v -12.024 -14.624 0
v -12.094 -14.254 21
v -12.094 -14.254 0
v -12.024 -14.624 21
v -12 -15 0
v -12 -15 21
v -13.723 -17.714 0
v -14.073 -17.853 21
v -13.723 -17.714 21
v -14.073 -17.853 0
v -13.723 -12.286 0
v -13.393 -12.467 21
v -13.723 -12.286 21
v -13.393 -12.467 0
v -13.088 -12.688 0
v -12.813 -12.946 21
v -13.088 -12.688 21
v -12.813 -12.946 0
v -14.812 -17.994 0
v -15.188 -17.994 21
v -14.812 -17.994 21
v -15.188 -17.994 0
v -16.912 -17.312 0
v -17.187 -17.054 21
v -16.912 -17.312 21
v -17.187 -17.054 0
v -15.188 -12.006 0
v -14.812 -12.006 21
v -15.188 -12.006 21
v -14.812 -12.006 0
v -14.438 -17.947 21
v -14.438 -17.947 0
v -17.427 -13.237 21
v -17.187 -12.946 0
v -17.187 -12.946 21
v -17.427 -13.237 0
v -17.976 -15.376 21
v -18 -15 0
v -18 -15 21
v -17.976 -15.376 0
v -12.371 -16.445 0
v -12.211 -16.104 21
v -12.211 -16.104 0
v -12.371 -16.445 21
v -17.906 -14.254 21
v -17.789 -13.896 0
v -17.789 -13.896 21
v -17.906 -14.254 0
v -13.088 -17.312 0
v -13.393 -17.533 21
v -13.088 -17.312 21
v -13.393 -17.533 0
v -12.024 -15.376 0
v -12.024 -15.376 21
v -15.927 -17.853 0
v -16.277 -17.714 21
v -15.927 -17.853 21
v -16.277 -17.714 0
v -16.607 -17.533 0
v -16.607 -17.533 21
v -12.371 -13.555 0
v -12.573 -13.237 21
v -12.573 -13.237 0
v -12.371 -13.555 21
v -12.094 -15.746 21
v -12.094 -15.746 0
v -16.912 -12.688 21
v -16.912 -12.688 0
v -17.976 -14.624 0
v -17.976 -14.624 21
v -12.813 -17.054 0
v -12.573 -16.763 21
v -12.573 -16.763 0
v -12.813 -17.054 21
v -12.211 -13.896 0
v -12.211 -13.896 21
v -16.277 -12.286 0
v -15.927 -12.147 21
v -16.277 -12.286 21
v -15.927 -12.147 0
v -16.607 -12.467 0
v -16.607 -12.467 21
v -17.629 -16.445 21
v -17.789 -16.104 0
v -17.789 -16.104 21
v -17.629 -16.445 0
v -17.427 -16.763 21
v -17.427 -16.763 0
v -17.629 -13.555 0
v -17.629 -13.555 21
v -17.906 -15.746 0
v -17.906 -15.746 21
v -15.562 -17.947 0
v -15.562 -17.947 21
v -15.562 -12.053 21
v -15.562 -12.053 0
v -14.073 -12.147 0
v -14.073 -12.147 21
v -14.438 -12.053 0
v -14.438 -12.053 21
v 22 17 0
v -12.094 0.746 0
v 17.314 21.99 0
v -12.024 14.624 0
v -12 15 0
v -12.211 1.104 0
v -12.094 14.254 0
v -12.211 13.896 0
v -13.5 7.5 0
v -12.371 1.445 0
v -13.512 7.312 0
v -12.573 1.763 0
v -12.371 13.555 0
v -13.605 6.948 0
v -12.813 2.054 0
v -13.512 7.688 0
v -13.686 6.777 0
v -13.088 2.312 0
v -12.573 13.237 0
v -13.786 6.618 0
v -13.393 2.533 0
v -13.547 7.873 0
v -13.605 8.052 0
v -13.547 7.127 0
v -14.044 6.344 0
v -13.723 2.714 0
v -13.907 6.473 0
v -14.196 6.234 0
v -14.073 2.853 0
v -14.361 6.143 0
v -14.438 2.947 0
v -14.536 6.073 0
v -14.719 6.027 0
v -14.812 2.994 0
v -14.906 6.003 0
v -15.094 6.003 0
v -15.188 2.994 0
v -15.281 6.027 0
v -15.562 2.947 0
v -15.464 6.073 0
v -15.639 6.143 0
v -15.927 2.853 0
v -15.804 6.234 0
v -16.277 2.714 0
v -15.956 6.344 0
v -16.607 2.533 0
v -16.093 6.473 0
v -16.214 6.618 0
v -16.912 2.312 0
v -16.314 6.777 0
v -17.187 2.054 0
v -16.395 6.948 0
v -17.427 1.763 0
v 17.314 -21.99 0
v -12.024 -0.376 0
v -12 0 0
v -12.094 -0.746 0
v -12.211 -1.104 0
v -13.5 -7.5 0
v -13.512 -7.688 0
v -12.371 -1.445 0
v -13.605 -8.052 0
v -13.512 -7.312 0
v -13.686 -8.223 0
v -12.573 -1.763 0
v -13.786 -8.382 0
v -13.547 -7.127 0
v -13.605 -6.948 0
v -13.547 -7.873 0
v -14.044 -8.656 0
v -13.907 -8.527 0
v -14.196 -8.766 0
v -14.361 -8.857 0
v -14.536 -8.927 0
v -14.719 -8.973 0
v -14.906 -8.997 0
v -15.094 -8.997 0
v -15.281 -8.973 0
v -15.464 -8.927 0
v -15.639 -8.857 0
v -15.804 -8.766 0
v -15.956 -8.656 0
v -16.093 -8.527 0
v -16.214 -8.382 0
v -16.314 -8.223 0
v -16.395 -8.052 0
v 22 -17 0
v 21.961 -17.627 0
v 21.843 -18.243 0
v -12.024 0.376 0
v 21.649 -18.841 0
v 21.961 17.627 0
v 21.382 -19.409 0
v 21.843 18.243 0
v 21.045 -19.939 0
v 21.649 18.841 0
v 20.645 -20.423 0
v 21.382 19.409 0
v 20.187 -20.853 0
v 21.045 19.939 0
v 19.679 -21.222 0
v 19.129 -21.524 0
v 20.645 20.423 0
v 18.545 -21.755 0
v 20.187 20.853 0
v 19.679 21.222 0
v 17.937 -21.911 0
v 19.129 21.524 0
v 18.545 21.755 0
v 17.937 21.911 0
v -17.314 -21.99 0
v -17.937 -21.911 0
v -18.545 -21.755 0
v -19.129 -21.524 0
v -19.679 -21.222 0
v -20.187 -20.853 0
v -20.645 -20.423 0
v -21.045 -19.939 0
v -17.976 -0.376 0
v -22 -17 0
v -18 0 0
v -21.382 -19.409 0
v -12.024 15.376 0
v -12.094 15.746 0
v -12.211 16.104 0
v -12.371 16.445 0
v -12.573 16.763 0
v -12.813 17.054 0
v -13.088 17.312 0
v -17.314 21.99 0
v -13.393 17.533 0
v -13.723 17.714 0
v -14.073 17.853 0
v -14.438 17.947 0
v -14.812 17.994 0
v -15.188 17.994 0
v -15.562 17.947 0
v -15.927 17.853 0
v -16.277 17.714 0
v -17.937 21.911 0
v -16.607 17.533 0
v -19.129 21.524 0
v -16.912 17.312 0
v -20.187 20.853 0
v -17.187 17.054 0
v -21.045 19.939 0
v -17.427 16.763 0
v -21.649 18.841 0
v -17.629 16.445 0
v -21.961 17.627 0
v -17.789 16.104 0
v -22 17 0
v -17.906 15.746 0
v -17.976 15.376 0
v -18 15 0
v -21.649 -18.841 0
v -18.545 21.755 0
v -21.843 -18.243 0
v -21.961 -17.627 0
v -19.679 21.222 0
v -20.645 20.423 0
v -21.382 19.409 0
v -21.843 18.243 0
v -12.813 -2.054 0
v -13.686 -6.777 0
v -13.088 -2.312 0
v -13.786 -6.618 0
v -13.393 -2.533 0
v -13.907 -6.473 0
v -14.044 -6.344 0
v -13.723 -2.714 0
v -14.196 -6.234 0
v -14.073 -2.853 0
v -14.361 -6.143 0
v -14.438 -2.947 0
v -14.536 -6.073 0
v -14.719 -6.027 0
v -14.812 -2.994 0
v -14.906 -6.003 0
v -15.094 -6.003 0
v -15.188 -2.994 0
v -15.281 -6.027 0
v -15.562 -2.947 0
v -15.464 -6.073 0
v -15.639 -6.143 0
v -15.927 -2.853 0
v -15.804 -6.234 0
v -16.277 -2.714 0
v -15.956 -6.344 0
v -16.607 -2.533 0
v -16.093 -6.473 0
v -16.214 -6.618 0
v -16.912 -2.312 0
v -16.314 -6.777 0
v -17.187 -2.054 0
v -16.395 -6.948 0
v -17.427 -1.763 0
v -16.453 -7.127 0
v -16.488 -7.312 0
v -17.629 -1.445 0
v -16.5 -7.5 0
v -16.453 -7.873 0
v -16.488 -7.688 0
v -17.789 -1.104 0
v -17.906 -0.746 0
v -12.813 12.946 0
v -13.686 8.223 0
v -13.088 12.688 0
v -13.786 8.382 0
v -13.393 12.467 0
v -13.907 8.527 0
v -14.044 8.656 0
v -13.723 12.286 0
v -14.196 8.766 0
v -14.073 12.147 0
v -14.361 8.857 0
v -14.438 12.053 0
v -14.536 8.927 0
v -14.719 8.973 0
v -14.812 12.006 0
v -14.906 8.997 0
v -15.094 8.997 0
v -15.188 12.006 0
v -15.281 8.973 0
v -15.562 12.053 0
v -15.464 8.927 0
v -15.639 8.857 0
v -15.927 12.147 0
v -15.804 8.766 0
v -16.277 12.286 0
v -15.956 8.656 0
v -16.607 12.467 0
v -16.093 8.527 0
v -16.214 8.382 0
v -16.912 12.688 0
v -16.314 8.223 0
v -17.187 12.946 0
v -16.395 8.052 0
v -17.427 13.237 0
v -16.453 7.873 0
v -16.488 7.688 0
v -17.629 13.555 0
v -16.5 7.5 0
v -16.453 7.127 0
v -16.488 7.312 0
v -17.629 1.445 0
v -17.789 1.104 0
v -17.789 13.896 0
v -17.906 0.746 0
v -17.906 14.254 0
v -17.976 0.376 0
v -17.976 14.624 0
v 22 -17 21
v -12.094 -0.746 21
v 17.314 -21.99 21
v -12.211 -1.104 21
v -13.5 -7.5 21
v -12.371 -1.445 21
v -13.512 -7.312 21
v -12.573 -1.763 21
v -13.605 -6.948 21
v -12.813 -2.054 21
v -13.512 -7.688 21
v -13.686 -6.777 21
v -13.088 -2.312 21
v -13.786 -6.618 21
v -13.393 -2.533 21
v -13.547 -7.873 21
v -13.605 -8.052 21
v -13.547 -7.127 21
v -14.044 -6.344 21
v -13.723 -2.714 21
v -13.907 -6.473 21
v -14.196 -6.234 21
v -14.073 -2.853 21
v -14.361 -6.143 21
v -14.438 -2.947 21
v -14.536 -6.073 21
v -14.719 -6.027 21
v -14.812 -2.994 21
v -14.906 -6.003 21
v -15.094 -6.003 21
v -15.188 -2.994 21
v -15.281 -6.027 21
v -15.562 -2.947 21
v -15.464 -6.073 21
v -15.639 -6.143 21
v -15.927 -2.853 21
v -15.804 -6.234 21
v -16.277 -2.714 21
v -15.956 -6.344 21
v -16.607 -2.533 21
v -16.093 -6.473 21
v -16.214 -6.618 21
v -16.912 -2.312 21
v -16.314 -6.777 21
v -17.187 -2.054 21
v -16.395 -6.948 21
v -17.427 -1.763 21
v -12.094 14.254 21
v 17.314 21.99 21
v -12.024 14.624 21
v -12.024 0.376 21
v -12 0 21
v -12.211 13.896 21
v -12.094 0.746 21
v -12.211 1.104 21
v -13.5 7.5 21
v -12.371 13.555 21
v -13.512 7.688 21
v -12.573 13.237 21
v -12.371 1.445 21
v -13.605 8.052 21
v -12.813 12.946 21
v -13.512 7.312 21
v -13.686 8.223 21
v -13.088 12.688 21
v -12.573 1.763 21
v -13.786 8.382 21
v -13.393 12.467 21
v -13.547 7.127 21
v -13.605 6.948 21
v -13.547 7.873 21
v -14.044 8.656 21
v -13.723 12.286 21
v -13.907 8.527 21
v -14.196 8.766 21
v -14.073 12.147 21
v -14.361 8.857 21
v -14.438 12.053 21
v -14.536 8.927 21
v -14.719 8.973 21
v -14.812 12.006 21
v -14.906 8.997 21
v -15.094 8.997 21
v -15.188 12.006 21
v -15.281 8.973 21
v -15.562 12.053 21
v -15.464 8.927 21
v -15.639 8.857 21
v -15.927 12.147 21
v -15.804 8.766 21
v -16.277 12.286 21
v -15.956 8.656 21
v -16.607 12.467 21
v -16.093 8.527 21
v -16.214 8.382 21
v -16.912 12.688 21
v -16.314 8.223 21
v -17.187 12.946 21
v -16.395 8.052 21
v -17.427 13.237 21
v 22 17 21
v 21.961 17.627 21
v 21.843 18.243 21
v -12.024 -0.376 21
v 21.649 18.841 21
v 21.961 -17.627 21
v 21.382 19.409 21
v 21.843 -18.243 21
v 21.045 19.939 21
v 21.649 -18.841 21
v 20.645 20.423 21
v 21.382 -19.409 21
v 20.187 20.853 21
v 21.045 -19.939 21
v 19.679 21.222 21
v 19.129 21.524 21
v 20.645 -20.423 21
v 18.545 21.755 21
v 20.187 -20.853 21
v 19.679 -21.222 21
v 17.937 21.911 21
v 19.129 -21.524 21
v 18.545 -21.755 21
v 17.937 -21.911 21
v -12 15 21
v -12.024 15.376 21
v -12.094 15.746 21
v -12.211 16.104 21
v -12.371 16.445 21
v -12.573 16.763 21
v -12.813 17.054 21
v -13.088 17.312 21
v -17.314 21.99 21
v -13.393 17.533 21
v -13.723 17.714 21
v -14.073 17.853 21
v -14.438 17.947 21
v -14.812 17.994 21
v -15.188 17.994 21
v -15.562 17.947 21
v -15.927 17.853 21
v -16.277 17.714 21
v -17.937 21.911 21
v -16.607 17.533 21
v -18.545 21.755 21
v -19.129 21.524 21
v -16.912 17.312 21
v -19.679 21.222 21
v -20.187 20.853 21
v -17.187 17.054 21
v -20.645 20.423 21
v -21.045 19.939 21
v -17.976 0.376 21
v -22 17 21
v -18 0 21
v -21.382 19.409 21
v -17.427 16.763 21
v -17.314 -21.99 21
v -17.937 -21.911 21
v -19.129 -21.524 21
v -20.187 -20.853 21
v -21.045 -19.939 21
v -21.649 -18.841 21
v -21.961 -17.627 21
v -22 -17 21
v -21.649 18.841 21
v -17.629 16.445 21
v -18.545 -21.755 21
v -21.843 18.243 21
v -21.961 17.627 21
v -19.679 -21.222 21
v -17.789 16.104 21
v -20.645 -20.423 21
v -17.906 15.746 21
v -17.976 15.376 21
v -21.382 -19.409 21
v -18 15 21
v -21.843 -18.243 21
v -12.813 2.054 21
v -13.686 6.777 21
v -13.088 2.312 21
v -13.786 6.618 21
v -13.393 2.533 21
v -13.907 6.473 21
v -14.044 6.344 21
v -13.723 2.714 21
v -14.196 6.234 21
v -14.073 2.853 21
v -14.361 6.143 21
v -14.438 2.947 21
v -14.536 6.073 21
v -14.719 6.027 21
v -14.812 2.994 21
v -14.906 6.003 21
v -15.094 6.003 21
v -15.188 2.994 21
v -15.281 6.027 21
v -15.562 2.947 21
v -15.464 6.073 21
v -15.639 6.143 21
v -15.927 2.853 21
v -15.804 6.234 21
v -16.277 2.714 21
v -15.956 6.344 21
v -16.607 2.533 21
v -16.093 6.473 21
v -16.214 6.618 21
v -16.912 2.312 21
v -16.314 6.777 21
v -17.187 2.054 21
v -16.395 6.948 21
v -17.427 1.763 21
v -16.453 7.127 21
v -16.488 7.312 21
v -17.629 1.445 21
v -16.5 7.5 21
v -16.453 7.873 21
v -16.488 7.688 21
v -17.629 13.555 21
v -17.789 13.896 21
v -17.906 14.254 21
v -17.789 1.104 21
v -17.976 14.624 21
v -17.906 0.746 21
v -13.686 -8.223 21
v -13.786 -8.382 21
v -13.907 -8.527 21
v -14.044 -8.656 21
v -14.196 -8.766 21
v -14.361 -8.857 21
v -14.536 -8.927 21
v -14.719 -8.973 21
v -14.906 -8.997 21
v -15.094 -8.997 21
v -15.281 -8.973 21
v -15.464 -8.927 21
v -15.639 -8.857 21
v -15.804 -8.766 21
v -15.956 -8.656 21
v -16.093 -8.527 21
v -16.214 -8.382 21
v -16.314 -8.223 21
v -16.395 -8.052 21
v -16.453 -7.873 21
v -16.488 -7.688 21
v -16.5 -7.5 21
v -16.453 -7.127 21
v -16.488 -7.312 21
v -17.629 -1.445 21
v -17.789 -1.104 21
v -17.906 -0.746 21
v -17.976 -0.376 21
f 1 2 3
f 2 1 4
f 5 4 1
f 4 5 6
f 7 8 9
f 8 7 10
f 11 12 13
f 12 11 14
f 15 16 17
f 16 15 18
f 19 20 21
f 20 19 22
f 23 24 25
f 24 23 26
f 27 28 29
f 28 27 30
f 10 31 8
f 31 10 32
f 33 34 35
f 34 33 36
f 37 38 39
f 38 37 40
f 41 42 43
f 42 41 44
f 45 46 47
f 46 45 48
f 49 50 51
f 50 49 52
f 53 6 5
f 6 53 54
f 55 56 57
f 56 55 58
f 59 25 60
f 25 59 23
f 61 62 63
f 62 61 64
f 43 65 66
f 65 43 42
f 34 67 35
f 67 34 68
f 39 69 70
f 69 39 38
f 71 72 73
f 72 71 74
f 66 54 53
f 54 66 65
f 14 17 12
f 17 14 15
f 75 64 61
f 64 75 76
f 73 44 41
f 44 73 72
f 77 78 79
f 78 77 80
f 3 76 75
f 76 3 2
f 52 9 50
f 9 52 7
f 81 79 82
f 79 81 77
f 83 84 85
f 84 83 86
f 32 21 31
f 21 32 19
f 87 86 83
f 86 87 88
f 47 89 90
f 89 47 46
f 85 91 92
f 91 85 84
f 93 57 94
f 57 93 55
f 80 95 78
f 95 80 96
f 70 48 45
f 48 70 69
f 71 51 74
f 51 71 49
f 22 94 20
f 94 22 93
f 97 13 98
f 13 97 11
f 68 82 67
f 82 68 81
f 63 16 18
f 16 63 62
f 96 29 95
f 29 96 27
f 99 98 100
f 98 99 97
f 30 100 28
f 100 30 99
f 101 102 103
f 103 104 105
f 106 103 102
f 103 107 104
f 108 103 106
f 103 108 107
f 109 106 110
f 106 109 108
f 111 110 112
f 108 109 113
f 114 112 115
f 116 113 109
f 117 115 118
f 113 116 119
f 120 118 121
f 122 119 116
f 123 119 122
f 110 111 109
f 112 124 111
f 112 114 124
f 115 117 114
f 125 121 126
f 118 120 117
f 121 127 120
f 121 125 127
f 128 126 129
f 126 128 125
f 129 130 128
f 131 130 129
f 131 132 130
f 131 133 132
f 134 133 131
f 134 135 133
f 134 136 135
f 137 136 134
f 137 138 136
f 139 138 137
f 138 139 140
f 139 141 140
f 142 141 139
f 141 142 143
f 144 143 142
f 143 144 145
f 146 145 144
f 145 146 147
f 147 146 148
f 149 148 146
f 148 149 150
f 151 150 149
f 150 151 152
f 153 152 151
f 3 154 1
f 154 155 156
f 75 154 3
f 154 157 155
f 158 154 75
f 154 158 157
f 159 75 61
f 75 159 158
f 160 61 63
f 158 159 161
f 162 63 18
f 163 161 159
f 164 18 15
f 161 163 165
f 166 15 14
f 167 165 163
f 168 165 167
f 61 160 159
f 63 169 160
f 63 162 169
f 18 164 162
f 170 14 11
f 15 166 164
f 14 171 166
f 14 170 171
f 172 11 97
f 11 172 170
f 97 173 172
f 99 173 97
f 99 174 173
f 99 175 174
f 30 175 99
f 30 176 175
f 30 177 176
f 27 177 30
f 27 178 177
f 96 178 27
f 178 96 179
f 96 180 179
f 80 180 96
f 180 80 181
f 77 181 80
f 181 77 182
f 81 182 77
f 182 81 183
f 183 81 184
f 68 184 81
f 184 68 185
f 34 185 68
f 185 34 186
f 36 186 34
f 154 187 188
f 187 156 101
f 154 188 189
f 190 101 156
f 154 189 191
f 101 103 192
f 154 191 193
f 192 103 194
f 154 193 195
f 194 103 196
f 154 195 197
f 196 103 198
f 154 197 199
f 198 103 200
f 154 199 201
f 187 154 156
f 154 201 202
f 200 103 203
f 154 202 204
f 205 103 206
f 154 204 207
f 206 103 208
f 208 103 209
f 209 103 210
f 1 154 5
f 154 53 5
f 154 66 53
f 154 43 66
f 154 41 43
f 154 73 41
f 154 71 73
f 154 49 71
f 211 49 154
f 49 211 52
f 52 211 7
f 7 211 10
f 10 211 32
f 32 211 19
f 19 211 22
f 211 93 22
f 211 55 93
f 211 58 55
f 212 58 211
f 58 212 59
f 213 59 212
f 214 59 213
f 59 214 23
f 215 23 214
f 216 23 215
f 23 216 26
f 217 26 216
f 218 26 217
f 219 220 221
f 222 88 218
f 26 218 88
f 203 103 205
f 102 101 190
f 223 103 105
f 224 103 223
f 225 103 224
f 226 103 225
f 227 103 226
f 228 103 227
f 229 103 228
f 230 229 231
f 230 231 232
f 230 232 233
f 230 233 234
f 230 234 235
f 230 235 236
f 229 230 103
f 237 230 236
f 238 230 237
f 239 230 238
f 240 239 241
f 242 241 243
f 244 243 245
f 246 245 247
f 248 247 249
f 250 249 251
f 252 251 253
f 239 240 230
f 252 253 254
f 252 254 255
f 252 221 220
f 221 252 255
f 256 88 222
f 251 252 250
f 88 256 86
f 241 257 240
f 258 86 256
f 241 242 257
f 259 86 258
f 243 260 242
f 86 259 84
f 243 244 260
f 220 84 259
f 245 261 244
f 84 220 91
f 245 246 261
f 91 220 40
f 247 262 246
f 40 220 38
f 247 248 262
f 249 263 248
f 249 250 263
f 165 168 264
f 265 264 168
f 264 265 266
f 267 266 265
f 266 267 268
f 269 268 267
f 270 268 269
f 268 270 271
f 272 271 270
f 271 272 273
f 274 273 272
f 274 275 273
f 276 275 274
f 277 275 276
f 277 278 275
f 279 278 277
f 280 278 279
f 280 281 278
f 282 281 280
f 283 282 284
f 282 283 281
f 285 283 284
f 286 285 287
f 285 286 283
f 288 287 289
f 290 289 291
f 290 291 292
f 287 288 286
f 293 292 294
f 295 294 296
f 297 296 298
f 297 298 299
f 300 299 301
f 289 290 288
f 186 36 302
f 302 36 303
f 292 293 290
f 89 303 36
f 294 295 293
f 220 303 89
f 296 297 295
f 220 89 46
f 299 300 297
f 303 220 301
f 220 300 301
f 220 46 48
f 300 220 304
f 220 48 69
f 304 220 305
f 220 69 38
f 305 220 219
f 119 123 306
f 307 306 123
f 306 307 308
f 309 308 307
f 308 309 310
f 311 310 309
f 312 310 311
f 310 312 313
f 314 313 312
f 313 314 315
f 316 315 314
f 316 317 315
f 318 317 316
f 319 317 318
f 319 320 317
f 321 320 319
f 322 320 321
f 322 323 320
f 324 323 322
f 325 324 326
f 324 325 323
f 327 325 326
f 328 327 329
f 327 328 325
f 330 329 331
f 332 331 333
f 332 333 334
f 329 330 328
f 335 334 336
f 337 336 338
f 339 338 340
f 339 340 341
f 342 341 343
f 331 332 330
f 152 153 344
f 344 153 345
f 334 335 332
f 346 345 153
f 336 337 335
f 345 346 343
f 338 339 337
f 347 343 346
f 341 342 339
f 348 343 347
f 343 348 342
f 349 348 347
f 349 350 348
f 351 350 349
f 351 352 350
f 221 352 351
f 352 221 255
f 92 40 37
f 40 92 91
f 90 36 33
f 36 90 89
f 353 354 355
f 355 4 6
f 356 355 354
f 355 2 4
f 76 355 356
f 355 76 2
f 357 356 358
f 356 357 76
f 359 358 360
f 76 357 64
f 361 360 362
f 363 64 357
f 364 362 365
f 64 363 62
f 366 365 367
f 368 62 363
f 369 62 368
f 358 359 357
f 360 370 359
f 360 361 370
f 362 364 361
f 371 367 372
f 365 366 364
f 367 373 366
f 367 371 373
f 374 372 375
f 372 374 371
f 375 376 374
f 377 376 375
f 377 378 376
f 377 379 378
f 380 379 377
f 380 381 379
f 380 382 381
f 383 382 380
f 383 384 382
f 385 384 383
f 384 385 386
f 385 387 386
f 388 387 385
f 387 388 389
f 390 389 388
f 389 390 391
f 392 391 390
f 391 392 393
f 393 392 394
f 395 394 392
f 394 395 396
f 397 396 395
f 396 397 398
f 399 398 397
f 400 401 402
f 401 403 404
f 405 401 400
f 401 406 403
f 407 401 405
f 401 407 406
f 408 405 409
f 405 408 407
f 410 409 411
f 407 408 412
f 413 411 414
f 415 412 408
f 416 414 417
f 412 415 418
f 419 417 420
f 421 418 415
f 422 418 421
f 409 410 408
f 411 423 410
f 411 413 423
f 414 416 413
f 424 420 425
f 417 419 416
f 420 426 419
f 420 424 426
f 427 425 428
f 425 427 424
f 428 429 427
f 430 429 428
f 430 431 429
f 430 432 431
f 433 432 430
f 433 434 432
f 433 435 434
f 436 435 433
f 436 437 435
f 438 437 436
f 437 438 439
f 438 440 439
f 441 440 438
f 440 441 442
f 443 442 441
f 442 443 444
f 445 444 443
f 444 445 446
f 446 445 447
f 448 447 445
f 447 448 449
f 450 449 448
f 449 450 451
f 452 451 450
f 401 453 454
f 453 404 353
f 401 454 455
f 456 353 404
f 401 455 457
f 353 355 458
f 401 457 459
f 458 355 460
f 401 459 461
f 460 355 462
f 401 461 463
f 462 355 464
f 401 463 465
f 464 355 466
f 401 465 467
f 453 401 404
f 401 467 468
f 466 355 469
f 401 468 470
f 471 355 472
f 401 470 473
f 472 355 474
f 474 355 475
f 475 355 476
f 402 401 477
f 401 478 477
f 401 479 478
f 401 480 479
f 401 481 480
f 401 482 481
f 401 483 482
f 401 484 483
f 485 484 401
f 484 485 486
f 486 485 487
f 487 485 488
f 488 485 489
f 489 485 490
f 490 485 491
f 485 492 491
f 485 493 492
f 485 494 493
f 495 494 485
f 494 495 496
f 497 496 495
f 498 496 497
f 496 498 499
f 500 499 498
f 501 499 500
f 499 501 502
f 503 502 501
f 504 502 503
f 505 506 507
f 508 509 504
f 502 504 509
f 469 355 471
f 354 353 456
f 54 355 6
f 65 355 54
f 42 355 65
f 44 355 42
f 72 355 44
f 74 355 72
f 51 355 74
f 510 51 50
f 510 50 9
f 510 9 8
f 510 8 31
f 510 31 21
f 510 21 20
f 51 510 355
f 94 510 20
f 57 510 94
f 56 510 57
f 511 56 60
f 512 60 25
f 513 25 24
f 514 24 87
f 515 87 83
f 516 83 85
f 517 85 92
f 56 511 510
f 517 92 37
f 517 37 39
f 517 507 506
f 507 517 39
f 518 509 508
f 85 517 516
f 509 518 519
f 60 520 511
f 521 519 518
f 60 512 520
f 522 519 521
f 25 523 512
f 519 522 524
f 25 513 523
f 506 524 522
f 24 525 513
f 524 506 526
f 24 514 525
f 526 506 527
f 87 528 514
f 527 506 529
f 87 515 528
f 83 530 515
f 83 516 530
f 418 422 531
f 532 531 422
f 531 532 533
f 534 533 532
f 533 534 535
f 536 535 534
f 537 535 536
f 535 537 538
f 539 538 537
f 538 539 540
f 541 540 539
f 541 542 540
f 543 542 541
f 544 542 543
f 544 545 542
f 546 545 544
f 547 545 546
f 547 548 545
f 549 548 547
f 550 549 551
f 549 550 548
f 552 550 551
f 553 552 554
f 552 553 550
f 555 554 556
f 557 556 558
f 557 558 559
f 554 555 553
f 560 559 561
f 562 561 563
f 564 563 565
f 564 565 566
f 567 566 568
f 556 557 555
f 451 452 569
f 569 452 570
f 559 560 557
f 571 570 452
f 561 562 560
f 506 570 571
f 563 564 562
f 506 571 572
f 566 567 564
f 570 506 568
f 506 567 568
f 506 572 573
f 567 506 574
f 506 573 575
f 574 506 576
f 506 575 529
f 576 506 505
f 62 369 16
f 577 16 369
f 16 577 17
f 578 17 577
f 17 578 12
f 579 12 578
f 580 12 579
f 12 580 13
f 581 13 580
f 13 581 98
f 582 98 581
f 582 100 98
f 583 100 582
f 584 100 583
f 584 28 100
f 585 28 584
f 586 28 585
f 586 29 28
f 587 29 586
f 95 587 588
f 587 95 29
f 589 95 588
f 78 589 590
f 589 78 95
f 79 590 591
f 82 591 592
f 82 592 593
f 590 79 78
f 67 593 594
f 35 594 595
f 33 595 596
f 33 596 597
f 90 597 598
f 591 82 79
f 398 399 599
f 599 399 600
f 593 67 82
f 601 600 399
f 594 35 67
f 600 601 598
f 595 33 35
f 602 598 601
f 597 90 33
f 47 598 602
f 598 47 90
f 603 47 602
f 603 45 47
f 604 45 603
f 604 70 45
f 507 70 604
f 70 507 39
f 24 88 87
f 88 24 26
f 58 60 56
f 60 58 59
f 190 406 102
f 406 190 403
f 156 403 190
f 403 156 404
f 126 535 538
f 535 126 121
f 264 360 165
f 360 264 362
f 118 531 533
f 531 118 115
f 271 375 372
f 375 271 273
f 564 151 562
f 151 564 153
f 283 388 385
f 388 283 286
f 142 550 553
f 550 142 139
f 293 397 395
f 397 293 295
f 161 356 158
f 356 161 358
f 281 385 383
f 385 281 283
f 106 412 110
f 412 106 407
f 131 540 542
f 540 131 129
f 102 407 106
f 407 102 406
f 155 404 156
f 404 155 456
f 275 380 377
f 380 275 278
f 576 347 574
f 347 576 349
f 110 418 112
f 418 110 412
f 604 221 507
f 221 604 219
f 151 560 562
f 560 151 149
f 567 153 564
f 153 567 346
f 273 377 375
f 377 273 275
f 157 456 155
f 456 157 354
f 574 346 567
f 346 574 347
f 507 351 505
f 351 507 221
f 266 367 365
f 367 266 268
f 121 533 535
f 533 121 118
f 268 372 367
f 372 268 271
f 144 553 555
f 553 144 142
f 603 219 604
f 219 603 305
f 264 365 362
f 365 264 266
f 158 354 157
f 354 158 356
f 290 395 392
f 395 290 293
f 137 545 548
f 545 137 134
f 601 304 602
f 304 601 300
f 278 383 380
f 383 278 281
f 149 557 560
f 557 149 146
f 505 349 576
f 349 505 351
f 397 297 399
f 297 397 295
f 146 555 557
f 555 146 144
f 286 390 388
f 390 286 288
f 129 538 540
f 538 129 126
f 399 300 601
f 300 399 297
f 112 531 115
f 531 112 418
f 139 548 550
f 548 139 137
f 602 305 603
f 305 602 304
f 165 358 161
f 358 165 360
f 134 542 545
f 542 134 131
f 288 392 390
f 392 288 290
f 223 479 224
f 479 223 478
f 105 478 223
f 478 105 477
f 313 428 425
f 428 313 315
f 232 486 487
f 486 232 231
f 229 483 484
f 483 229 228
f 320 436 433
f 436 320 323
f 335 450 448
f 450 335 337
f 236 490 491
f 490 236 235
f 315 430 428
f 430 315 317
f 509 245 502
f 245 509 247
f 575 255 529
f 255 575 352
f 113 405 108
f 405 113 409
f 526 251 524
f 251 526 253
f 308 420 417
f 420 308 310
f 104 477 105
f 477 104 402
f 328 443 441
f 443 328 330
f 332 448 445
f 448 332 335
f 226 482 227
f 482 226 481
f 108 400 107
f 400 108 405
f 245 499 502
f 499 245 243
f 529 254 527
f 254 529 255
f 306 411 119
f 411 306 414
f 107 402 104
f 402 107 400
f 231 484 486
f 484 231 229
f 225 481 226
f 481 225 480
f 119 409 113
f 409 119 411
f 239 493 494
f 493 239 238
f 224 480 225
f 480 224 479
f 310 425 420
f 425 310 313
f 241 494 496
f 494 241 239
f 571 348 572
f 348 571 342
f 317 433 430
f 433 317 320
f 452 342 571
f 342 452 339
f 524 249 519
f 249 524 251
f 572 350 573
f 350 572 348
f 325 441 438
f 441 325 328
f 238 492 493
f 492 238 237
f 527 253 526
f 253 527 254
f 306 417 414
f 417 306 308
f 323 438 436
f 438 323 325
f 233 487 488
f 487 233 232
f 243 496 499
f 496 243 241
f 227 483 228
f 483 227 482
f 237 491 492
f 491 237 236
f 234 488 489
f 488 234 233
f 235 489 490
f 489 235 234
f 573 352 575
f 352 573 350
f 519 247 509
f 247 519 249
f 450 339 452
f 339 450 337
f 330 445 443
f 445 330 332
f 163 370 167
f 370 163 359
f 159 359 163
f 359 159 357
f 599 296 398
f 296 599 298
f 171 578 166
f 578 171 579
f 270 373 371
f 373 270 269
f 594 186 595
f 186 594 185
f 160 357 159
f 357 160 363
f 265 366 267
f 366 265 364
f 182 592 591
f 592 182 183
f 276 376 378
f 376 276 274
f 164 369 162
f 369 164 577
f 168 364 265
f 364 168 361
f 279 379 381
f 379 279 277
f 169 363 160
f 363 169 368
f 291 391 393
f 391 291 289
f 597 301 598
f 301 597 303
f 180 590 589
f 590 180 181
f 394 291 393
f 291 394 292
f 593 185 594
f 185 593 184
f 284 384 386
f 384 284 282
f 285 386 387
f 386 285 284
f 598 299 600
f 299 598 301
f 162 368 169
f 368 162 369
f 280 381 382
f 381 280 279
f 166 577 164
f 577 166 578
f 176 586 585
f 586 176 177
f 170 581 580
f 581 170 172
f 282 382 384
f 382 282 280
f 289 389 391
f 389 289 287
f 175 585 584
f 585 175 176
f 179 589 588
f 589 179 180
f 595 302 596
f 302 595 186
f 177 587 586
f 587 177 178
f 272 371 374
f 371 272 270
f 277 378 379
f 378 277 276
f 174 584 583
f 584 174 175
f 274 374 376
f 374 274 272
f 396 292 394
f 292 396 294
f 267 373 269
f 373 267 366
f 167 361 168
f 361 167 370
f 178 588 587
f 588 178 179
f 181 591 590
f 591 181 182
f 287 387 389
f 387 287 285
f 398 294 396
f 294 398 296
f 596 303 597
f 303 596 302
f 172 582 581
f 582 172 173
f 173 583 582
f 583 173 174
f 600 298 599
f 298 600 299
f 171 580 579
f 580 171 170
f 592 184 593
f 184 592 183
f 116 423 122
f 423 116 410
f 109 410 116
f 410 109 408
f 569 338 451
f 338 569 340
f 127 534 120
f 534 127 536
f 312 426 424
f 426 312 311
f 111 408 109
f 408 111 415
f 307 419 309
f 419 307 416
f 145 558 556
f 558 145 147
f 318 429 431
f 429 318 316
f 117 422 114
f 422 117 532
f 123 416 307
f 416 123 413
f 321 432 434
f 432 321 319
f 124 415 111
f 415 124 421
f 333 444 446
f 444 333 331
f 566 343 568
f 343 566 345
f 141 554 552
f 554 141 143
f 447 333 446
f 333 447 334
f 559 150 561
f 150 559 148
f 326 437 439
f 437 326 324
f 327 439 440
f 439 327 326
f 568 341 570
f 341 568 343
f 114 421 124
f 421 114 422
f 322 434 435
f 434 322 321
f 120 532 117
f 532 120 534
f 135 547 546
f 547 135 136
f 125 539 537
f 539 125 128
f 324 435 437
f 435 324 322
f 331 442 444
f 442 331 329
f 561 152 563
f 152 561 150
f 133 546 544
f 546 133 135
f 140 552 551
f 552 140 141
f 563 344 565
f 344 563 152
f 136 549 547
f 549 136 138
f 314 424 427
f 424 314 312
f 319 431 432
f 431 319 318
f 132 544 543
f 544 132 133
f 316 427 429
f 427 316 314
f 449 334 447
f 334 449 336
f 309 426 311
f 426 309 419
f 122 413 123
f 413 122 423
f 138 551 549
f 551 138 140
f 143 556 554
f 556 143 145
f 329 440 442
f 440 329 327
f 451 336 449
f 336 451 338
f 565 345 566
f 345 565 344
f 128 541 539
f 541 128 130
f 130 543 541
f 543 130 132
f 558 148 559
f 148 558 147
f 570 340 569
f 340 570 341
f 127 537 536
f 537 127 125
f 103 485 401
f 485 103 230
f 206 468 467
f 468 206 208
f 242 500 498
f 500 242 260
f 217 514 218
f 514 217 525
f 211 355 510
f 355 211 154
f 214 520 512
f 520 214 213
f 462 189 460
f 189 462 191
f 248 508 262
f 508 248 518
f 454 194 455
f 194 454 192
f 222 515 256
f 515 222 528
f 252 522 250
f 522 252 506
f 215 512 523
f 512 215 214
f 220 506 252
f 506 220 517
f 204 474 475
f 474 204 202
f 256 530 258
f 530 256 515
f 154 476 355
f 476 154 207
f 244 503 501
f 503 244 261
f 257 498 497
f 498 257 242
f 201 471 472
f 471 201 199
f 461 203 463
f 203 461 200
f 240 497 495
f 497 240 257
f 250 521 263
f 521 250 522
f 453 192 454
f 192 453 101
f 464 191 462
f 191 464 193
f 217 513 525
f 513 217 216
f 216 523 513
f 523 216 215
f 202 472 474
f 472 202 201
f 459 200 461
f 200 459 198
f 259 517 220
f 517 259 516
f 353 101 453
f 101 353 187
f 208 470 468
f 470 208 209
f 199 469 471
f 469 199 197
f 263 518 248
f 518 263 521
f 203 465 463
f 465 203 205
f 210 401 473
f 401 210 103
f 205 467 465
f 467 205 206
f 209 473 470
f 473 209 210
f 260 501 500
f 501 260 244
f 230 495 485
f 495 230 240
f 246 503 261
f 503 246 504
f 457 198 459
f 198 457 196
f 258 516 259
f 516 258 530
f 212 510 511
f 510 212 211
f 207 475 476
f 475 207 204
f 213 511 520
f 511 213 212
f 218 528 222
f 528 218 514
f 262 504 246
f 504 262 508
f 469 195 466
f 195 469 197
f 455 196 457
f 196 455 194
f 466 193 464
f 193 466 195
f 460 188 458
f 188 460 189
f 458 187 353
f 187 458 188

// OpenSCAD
$fn = 50;


difference() {
	union() {
		hull() {
			translate(v = [-17.0000000000, 17.0000000000, 0]) {
				cylinder(h = 21, r = 5);
			}
			translate(v = [17.0000000000, 17.0000000000, 0]) {
				cylinder(h = 21, r = 5);
			}
			translate(v = [-17.0000000000, -17.0000000000, 0]) {
				cylinder(h = 21, r = 5);
			}
			translate(v = [17.0000000000, -17.0000000000, 0]) {
				cylinder(h = 21, r = 5);
			}
		}
	}
	union() {
		translate(v = [-15.0000000000, -15.0000000000, 0]) {
			cylinder(h = 21, r = 3.0000000000);
		}
		translate(v = [-15.0000000000, 0.0000000000, 0]) {
			cylinder(h = 21, r = 3.0000000000);
		}
		translate(v = [-15.0000000000, 15.0000000000, 0]) {
			cylinder(h = 21, r = 3.0000000000);
		}
		translate(v = [-15.0000000000, -15.0000000000, 0]) {
			cylinder(h = 21, r = 1.5000000000);
		}
		translate(v = [-15.0000000000, -7.5000000000, 0]) {
			cylinder(h = 21, r = 1.5000000000);
		}
		translate(v = [-15.0000000000, 0.0000000000, 0]) {
			cylinder(h = 21, r = 1.5000000000);
		}
		translate(v = [-15.0000000000, 7.5000000000, 0]) {
			cylinder(h = 21, r = 1.5000000000);
		}
		translate(v = [-15.0000000000, 15.0000000000, 0]) {
			cylinder(h = 21, r = 1.5000000000);
		}
		translate(v = [-15.0000000000, -15.0000000000, 0]) {
			cylinder(h = 21, r = 1.5000000000);
		}
		translate(v = [-15.0000000000, -7.5000000000, 0]) {
			cylinder(h = 21, r = 1.5000000000);
		}
		translate(v = [-15.0000000000, 0.0000000000, 0]) {
			cylinder(h = 21, r = 1.5000000000);
		}
		translate(v = [-15.0000000000, 7.5000000000, 0]) {
			cylinder(h = 21, r = 1.5000000000);
		}
		translate(v = [-15.0000000000, 15.0000000000, 0]) {
			cylinder(h = 21, r = 1.5000000000);
		}
		translate(v = [-15.0000000000, -15.0000000000, 0]) {
			cylinder(h = 21, r = 1.5000000000);
		}
		translate(v = [-15.0000000000, -7.5000000000, 0]) {
			cylinder(h = 21, r = 1.5000000000);
		}
		translate(v = [-15.0000000000, 0.0000000000, 0]) {
			cylinder(h = 21, r = 1.5000000000);
		}
		translate(v = [-15.0000000000, 7.5000000000, 0]) {
			cylinder(h = 21, r = 1.5000000000);
		}
		translate(v = [-15.0000000000, 15.0000000000, 0]) {
			cylinder(h = 21, r = 1.5000000000);
		}
	}
}
